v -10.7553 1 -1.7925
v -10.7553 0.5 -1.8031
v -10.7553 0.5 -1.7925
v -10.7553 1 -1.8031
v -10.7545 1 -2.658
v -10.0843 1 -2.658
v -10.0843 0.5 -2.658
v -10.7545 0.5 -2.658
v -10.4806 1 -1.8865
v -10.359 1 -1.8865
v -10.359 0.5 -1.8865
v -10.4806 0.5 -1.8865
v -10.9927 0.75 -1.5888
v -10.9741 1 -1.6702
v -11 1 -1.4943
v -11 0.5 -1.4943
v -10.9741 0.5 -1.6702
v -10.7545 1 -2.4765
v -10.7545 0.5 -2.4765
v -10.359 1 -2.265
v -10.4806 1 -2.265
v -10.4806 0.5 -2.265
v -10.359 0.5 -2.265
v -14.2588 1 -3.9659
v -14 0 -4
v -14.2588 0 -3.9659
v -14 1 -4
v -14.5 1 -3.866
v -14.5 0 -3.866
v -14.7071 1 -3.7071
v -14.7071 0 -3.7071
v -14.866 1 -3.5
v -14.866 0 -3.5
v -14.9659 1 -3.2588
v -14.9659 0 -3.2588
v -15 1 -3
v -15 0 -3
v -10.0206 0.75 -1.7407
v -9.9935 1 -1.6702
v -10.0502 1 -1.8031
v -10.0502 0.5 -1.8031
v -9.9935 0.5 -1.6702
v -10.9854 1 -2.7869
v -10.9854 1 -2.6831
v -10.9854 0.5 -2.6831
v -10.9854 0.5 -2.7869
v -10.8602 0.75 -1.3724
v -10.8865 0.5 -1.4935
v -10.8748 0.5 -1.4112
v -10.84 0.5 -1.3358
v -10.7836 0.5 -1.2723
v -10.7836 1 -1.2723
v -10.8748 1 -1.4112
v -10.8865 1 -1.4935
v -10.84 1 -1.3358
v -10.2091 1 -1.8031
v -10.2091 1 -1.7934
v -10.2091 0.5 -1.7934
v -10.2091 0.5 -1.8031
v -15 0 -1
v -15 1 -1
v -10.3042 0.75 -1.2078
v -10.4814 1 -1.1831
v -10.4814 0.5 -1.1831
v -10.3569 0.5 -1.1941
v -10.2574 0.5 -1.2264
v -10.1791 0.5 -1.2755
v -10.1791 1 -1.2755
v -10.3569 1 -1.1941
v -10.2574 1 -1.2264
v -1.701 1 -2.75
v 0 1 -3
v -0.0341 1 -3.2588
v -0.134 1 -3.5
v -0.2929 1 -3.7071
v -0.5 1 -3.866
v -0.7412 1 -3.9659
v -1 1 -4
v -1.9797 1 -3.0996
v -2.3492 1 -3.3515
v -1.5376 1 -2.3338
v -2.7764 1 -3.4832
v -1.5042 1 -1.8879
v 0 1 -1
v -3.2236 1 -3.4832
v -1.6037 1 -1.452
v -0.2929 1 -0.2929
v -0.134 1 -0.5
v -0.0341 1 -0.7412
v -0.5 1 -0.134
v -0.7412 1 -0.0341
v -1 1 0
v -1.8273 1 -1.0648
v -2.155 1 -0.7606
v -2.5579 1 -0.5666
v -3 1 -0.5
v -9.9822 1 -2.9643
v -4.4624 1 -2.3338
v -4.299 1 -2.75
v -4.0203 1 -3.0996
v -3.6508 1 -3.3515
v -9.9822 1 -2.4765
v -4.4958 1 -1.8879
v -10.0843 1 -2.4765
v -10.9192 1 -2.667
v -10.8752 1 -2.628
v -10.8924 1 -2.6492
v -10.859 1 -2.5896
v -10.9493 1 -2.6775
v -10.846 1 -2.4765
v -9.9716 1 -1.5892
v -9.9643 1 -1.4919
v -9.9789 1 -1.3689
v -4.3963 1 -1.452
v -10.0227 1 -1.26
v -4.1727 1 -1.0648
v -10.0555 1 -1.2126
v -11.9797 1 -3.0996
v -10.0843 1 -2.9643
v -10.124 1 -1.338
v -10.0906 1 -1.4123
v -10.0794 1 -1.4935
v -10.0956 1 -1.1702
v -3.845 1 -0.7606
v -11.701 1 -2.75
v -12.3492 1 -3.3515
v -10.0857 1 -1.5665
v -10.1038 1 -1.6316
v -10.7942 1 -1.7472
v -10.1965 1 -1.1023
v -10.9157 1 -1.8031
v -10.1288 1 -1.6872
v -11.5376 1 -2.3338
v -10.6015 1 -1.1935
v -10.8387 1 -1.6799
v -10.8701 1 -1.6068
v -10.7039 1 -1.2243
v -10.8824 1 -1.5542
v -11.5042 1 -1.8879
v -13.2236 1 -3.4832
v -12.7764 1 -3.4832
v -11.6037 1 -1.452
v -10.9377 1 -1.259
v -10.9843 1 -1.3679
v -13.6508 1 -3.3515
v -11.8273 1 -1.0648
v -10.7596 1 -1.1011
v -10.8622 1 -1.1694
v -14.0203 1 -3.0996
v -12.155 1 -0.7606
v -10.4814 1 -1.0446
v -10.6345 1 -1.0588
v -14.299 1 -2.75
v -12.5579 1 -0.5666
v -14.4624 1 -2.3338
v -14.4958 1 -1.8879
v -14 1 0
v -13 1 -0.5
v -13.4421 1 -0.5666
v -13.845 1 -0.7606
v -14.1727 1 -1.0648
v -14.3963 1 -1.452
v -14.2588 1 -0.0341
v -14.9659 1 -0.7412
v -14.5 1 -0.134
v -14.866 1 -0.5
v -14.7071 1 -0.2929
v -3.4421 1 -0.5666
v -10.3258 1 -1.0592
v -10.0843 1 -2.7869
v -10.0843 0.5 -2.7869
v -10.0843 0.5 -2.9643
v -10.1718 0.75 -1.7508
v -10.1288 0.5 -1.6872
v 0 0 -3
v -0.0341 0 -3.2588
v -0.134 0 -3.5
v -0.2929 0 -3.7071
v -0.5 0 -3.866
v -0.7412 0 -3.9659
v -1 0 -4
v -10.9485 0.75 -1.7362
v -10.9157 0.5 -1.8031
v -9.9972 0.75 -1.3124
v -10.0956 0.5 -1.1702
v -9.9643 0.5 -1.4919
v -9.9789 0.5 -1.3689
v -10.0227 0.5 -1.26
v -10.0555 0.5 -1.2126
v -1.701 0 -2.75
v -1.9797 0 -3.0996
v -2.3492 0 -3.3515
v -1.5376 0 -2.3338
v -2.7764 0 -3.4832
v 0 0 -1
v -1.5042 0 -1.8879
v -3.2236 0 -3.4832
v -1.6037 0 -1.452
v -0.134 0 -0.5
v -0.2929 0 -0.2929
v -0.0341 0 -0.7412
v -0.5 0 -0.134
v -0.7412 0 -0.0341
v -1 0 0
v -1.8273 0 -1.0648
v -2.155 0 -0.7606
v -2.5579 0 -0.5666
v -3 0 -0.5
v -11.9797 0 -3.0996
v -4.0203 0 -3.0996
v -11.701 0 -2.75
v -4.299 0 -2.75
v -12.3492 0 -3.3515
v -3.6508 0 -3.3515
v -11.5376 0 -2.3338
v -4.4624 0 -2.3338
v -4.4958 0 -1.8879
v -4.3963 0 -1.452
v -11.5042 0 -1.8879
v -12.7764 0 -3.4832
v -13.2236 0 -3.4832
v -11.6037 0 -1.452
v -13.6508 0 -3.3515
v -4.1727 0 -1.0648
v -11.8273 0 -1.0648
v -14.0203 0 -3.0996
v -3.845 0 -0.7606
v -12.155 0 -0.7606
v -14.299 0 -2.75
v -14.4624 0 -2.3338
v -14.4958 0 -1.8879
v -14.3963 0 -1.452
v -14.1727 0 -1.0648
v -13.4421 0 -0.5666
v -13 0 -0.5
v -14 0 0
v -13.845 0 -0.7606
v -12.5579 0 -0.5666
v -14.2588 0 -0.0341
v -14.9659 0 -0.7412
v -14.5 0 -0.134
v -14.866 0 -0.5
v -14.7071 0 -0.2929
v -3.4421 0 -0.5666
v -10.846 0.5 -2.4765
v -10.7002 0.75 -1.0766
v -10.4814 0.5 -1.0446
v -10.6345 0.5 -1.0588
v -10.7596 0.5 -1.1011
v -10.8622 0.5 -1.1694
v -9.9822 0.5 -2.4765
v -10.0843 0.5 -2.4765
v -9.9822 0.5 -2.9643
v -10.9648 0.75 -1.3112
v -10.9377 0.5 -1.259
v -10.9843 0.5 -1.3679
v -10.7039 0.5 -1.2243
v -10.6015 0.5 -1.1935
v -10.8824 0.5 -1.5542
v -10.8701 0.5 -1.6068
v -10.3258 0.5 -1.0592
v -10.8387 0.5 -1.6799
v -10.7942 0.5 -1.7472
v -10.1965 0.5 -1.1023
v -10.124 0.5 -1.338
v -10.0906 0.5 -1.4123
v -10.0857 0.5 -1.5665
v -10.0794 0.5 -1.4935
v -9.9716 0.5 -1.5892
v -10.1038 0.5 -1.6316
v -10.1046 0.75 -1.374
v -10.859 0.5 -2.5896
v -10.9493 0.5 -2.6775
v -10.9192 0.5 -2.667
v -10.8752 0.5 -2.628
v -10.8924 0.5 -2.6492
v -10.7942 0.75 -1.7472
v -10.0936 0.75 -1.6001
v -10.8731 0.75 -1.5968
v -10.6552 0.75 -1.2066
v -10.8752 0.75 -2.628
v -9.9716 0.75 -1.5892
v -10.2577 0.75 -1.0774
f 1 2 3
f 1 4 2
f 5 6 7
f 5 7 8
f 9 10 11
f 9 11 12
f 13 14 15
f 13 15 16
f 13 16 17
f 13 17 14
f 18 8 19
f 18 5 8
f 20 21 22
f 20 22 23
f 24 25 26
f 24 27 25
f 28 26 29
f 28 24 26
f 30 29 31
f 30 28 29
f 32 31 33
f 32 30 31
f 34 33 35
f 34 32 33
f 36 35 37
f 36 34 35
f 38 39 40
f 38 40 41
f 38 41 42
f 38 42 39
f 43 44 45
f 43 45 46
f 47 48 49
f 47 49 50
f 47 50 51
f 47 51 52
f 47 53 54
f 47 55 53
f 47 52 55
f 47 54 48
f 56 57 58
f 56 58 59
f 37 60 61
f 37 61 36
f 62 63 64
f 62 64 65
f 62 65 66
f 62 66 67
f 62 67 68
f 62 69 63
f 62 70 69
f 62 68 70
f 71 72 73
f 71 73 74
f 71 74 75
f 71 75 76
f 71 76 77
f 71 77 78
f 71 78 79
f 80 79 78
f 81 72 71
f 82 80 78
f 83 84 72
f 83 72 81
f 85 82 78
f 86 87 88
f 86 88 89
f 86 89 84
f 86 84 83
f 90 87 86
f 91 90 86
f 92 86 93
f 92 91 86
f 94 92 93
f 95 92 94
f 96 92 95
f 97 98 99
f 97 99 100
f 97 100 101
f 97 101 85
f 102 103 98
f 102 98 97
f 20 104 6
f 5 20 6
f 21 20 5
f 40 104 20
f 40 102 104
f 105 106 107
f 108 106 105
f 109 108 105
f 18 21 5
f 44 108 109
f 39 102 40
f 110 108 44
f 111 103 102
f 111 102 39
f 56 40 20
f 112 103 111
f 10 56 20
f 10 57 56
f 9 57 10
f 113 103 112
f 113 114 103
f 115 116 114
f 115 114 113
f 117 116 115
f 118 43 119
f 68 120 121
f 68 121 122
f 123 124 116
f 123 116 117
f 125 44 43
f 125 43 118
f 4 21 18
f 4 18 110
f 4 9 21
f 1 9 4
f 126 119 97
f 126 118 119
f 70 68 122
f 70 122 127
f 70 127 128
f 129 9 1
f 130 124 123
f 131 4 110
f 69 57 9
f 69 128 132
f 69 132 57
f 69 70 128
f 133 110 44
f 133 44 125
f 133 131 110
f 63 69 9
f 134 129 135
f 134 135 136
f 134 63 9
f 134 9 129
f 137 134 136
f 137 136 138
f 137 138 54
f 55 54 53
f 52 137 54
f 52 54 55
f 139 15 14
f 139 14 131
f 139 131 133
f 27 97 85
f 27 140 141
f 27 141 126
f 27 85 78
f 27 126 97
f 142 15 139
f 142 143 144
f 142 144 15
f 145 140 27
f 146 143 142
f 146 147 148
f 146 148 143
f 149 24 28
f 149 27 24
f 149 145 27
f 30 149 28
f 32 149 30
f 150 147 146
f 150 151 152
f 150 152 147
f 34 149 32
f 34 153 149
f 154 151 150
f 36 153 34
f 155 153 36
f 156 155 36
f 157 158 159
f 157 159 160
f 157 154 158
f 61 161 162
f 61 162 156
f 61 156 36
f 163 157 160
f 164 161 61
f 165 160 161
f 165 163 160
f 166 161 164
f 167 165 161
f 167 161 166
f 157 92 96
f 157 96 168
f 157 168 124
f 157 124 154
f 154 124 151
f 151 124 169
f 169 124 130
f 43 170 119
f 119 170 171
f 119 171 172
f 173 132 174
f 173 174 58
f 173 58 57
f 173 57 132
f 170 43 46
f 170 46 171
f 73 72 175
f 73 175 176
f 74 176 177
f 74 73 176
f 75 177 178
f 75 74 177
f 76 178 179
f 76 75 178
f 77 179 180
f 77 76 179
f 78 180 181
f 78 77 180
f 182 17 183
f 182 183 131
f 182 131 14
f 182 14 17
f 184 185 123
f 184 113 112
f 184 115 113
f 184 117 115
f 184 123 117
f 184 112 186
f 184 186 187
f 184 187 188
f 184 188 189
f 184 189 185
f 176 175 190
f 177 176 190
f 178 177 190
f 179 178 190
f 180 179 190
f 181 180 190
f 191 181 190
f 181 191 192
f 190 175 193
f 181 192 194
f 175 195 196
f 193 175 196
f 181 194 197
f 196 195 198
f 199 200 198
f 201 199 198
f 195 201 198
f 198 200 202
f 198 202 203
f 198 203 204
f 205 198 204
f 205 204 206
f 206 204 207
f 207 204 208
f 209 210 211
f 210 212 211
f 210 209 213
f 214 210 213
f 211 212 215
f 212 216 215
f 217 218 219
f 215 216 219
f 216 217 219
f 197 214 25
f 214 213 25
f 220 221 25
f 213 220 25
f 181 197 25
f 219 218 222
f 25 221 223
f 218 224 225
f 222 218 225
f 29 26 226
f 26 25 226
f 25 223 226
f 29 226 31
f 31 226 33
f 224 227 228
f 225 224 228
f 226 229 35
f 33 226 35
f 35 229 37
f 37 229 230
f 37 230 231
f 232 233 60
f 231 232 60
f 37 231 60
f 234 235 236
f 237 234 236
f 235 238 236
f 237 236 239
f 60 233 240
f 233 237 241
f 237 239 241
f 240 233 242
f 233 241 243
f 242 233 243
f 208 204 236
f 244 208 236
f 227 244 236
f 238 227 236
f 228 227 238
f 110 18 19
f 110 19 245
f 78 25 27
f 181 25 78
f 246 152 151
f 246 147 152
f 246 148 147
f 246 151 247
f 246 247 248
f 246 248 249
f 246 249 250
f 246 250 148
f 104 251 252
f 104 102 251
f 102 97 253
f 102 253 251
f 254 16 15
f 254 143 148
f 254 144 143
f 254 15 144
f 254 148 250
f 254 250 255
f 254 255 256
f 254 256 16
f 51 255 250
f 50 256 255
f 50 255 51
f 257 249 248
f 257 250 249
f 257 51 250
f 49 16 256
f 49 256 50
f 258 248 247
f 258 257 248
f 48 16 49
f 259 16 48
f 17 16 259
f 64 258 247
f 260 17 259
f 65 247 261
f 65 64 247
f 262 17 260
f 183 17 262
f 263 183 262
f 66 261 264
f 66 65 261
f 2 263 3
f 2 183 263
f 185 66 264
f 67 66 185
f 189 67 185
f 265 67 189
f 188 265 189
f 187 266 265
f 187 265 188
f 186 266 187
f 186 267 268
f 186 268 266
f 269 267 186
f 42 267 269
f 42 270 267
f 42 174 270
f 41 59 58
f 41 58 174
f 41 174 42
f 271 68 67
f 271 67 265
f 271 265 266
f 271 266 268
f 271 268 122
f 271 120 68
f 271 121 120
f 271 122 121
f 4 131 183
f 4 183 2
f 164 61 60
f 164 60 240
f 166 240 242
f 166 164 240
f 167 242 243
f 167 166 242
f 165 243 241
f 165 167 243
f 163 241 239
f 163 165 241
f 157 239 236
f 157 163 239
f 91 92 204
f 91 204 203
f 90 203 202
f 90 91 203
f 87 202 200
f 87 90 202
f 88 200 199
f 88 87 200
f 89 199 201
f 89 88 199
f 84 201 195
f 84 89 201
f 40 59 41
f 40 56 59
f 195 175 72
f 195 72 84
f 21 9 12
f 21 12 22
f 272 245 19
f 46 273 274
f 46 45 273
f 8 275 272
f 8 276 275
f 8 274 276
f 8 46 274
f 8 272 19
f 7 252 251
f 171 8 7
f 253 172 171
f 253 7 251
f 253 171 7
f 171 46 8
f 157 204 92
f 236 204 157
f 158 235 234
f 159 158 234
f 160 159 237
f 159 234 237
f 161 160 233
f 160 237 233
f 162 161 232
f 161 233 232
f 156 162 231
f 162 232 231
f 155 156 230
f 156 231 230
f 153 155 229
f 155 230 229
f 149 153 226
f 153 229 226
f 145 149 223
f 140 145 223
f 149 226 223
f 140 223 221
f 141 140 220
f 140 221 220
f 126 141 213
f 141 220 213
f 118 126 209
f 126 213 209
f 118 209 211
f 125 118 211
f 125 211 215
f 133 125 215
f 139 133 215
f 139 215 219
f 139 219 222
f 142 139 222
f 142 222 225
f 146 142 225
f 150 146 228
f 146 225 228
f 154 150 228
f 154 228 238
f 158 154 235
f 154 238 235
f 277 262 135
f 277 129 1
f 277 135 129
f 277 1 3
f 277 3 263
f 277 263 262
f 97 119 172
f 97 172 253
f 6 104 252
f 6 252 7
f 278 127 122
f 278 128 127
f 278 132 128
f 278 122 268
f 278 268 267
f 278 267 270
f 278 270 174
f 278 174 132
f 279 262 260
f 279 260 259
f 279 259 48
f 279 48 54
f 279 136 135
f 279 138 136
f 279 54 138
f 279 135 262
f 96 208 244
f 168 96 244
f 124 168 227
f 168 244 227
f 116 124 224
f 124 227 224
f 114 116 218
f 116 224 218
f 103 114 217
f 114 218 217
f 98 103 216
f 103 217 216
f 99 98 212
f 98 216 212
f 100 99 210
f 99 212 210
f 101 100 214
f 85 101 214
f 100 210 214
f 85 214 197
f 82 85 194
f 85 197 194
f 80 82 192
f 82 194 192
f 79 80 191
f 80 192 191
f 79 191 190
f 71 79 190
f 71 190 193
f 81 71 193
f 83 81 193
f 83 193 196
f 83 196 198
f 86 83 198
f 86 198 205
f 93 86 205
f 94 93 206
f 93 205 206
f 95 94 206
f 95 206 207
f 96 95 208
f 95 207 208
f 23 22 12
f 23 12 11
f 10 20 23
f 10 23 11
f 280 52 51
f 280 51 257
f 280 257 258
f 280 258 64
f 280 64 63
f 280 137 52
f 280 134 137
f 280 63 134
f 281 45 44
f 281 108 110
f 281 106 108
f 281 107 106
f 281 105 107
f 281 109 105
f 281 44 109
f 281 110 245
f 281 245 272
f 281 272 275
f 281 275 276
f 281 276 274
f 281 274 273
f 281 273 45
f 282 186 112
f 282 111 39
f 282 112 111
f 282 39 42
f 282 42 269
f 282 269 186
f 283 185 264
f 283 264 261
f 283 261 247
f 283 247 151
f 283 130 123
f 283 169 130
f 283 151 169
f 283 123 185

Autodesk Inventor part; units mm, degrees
ref_plane "YZ Plane" through (0, 0, 0) normal (1, 0, 0) x (0, 1, 0)
ref_plane "XZ Plane" through (0, 0, 0) normal (0, 1, 0) x (-1, 0, 0)
ref_plane "XY Plane" through (0, 0, 0) normal (0, 0, 1) x (1, 0, 0)
sketch "Sketch1" plane through (0, 0, 0) normal (0, 1, 0) x (-1, 0, 0)
  line L0 (0, 0) -> (15, 0)
  line L1 (15, 0) -> (15, -4)
  line L2 (15, -4) -> (0, -4)
  line L3 (0, -4) -> (0, 0)
  dimension "d0" = 15
  dimension "d1" = 4
extrude "Extrusion1" add sketch "Sketch1" along normal blind 1
sketch "Sketch2" plane through (0, 1, 0) normal (0, 1, 0) x (1, 0, 0)
  line L0 (0, 4) -> (-15, 4) projected
  line L1 (-15, 4) -> (-15, 0) projected
  point P0 (0, 0)
  point P1 (-13, 2)
  dimension "d18" = 2
  dimension "d19" = 2
hole "Hole1" at (-13, 1, -2) direction (0, -1, 0) diameter 3 depth 5 tip angle 118
sketch "Sketch3" plane through (0, 1, 0) normal (0, 1, 0) x (1, 0, 0)
  line L0 (0, 0) -> (0, 4) projected
  line L1 (0, 4) -> (-15, 4) projected
  point P0 (-3, 2)
  dimension "d20" = 3
  dimension "d21" = 2
hole "Hole2" at (-3, 1, -2) direction (0, -1, 0) diameter 3 depth 5 tip angle 118
sketch "Sketch4" plane through (0, 1, 0) normal (0, 1, 0) x (1, 0, 0)
  point P0 (0, 0)
fillet "Fillet1" radius 1 4 edges at (0, 0.5, 0) (0, 0.5, -4) (-15, 0.5, 0) (-15, 0.5, -4)
sketch "Sketch5" plane through (0, 1, 0) normal (0, 1, 0) x (1, 0, 0)
  line L0 (-11, 1) -> (-11, 3) construction
  line L1 (-11, 3) -> (-5, 3) construction
  line L2 (-5, 3) -> (-5, 1) construction
  line L3 (-5, 1) -> (-11, 1) construction
  line L4 (-1, 4) -> (-14, 4) projected
  line L5 (-14, 0) -> (-1, 0) projected
  line L6 (0, 1) -> (0, 3) projected
  line L7 (-15, 3) -> (-15, 1) projected
  spline S0 degree 2 poles (-9.9643, 1.4919) (-9.9643, 1.3947) (-10.03, 1.2301) (-10.0956, 1.1702) knots 0 0 0 1 2 2 2
  spline S1 degree 2 poles (-10.0956, 1.1702) (-10.1605, 1.1102) (-10.3549, 1.0446) (-10.4814, 1.0446) knots 0 0 0 1 2 2 2
  spline S2 degree 2 poles (-10.4814, 1.0446) (-10.607, 1.0446) (-10.7934, 1.1086) (-10.8622, 1.1694) knots 0 0 0 1 2 2 2
  spline S3 degree 2 poles (-10.8622, 1.1694) (-10.9295, 1.2293) (-11, 1.393) (-11, 1.4943) knots 0 0 0 1 2 2 2
  spline S4 degree 2 poles (-11, 1.4943) (-11, 1.5446) (-10.9854, 1.6329) (-10.9741, 1.6702) knots 0 0 0 1 2 2 2
  spline S5 degree 2 poles (-10.9741, 1.6702) (-10.9635, 1.7026) (-10.9335, 1.7699) (-10.9157, 1.8031) knots 0 0 0 1 2 2 2
  line L8 (-10.9157, 1.8031) -> (-10.7553, 1.8031)
  line L9 (-10.7553, 1.8031) -> (-10.7553, 1.7925)
  spline S6 degree 2 poles (-10.7553, 1.7925) (-10.7715, 1.7747) (-10.8169, 1.7196) (-10.8387, 1.6799) knots 0 0 0 1 2 2 2
  spline S7 degree 2 poles (-10.8387, 1.6799) (-10.8598, 1.6418) (-10.8865, 1.5519) (-10.8865, 1.4935) knots 0 0 0 1 2 2 2
  spline S8 degree 2 poles (-10.8865, 1.4935) (-10.8865, 1.4295) (-10.8339, 1.3152) (-10.7836, 1.2723) knots 0 0 0 1 2 2 2
  spline S9 degree 2 poles (-10.7836, 1.2723) (-10.7326, 1.2301) (-10.5778, 1.1831) (-10.4814, 1.1831) knots 0 0 0 1 2 2 2
  spline S10 degree 2 poles (-10.4814, 1.1831) (-10.3784, 1.1831) (-10.2301, 1.2326) (-10.1791, 1.2755) knots 0 0 0 1 2 2 2
  spline S11 degree 2 poles (-10.1791, 1.2755) (-10.1297, 1.3177) (-10.0794, 1.4303) (-10.0794, 1.4935) knots 0 0 0 1 2 2 2
  spline S12 degree 2 poles (-10.0794, 1.4935) (-10.0794, 1.5511) (-10.1078, 1.6491) (-10.1288, 1.6872) knots 0 0 0 1 2 2 2
  spline S13 degree 2 poles (-10.1288, 1.6872) (-10.1499, 1.7237) (-10.1937, 1.778) (-10.2091, 1.7934) knots 0 0 0 1 2 2 2
  line L10 (-10.2091, 1.7934) -> (-10.2091, 1.8031)
  line L11 (-10.2091, 1.8031) -> (-10.0502, 1.8031)
  spline S14 degree 2 poles (-10.0502, 1.8031) (-10.0348, 1.7699) (-10.0065, 1.7115) (-9.9935, 1.6702) knots 0 0 0 1 2 2 2
  spline S15 degree 2 poles (-9.9935, 1.6702) (-9.9789, 1.6264) (-9.9643, 1.5519) (-9.9643, 1.4919) knots 0 0 0 1 2 2 2
  line L12 (-10.359, 2.265) -> (-10.359, 1.8865)
  line L13 (-10.359, 1.8865) -> (-10.4806, 1.8865)
  line L14 (-10.4806, 1.8865) -> (-10.4806, 2.265)
  line L15 (-10.4806, 2.265) -> (-10.359, 2.265)
  line L16 (-9.9822, 2.9643) -> (-9.9822, 2.4765)
  line L17 (-9.9822, 2.4765) -> (-10.0843, 2.4765)
  line L18 (-10.0843, 2.4765) -> (-10.0843, 2.658)
  line L19 (-10.0843, 2.658) -> (-10.7545, 2.658)
  line L20 (-10.7545, 2.658) -> (-10.7545, 2.4765)
  line L21 (-10.7545, 2.4765) -> (-10.846, 2.4765)
  spline S16 degree 2 poles (-10.846, 2.4765) (-10.846, 2.5794) (-10.9044, 2.6767) (-10.9854, 2.6831) knots 0 0 0 1 2 2 2
  line L22 (-10.9854, 2.6831) -> (-10.9854, 2.7869)
  line L23 (-10.9854, 2.7869) -> (-10.0843, 2.7869)
  line L24 (-10.0843, 2.7869) -> (-10.0843, 2.9643)
  line L25 (-10.0843, 2.9643) -> (-9.9822, 2.9643)
  point P0 (0, 0)
  point P1 (-8, 1)
  dimension "d23" = 1
  dimension "d24" = 1
  dimension "d25" = 5
  dimension "d26" = 4
extrude "Extrusion2" cut sketch "Sketch5" against normal blind 0.5
properties part number "Parts_Combiner"
